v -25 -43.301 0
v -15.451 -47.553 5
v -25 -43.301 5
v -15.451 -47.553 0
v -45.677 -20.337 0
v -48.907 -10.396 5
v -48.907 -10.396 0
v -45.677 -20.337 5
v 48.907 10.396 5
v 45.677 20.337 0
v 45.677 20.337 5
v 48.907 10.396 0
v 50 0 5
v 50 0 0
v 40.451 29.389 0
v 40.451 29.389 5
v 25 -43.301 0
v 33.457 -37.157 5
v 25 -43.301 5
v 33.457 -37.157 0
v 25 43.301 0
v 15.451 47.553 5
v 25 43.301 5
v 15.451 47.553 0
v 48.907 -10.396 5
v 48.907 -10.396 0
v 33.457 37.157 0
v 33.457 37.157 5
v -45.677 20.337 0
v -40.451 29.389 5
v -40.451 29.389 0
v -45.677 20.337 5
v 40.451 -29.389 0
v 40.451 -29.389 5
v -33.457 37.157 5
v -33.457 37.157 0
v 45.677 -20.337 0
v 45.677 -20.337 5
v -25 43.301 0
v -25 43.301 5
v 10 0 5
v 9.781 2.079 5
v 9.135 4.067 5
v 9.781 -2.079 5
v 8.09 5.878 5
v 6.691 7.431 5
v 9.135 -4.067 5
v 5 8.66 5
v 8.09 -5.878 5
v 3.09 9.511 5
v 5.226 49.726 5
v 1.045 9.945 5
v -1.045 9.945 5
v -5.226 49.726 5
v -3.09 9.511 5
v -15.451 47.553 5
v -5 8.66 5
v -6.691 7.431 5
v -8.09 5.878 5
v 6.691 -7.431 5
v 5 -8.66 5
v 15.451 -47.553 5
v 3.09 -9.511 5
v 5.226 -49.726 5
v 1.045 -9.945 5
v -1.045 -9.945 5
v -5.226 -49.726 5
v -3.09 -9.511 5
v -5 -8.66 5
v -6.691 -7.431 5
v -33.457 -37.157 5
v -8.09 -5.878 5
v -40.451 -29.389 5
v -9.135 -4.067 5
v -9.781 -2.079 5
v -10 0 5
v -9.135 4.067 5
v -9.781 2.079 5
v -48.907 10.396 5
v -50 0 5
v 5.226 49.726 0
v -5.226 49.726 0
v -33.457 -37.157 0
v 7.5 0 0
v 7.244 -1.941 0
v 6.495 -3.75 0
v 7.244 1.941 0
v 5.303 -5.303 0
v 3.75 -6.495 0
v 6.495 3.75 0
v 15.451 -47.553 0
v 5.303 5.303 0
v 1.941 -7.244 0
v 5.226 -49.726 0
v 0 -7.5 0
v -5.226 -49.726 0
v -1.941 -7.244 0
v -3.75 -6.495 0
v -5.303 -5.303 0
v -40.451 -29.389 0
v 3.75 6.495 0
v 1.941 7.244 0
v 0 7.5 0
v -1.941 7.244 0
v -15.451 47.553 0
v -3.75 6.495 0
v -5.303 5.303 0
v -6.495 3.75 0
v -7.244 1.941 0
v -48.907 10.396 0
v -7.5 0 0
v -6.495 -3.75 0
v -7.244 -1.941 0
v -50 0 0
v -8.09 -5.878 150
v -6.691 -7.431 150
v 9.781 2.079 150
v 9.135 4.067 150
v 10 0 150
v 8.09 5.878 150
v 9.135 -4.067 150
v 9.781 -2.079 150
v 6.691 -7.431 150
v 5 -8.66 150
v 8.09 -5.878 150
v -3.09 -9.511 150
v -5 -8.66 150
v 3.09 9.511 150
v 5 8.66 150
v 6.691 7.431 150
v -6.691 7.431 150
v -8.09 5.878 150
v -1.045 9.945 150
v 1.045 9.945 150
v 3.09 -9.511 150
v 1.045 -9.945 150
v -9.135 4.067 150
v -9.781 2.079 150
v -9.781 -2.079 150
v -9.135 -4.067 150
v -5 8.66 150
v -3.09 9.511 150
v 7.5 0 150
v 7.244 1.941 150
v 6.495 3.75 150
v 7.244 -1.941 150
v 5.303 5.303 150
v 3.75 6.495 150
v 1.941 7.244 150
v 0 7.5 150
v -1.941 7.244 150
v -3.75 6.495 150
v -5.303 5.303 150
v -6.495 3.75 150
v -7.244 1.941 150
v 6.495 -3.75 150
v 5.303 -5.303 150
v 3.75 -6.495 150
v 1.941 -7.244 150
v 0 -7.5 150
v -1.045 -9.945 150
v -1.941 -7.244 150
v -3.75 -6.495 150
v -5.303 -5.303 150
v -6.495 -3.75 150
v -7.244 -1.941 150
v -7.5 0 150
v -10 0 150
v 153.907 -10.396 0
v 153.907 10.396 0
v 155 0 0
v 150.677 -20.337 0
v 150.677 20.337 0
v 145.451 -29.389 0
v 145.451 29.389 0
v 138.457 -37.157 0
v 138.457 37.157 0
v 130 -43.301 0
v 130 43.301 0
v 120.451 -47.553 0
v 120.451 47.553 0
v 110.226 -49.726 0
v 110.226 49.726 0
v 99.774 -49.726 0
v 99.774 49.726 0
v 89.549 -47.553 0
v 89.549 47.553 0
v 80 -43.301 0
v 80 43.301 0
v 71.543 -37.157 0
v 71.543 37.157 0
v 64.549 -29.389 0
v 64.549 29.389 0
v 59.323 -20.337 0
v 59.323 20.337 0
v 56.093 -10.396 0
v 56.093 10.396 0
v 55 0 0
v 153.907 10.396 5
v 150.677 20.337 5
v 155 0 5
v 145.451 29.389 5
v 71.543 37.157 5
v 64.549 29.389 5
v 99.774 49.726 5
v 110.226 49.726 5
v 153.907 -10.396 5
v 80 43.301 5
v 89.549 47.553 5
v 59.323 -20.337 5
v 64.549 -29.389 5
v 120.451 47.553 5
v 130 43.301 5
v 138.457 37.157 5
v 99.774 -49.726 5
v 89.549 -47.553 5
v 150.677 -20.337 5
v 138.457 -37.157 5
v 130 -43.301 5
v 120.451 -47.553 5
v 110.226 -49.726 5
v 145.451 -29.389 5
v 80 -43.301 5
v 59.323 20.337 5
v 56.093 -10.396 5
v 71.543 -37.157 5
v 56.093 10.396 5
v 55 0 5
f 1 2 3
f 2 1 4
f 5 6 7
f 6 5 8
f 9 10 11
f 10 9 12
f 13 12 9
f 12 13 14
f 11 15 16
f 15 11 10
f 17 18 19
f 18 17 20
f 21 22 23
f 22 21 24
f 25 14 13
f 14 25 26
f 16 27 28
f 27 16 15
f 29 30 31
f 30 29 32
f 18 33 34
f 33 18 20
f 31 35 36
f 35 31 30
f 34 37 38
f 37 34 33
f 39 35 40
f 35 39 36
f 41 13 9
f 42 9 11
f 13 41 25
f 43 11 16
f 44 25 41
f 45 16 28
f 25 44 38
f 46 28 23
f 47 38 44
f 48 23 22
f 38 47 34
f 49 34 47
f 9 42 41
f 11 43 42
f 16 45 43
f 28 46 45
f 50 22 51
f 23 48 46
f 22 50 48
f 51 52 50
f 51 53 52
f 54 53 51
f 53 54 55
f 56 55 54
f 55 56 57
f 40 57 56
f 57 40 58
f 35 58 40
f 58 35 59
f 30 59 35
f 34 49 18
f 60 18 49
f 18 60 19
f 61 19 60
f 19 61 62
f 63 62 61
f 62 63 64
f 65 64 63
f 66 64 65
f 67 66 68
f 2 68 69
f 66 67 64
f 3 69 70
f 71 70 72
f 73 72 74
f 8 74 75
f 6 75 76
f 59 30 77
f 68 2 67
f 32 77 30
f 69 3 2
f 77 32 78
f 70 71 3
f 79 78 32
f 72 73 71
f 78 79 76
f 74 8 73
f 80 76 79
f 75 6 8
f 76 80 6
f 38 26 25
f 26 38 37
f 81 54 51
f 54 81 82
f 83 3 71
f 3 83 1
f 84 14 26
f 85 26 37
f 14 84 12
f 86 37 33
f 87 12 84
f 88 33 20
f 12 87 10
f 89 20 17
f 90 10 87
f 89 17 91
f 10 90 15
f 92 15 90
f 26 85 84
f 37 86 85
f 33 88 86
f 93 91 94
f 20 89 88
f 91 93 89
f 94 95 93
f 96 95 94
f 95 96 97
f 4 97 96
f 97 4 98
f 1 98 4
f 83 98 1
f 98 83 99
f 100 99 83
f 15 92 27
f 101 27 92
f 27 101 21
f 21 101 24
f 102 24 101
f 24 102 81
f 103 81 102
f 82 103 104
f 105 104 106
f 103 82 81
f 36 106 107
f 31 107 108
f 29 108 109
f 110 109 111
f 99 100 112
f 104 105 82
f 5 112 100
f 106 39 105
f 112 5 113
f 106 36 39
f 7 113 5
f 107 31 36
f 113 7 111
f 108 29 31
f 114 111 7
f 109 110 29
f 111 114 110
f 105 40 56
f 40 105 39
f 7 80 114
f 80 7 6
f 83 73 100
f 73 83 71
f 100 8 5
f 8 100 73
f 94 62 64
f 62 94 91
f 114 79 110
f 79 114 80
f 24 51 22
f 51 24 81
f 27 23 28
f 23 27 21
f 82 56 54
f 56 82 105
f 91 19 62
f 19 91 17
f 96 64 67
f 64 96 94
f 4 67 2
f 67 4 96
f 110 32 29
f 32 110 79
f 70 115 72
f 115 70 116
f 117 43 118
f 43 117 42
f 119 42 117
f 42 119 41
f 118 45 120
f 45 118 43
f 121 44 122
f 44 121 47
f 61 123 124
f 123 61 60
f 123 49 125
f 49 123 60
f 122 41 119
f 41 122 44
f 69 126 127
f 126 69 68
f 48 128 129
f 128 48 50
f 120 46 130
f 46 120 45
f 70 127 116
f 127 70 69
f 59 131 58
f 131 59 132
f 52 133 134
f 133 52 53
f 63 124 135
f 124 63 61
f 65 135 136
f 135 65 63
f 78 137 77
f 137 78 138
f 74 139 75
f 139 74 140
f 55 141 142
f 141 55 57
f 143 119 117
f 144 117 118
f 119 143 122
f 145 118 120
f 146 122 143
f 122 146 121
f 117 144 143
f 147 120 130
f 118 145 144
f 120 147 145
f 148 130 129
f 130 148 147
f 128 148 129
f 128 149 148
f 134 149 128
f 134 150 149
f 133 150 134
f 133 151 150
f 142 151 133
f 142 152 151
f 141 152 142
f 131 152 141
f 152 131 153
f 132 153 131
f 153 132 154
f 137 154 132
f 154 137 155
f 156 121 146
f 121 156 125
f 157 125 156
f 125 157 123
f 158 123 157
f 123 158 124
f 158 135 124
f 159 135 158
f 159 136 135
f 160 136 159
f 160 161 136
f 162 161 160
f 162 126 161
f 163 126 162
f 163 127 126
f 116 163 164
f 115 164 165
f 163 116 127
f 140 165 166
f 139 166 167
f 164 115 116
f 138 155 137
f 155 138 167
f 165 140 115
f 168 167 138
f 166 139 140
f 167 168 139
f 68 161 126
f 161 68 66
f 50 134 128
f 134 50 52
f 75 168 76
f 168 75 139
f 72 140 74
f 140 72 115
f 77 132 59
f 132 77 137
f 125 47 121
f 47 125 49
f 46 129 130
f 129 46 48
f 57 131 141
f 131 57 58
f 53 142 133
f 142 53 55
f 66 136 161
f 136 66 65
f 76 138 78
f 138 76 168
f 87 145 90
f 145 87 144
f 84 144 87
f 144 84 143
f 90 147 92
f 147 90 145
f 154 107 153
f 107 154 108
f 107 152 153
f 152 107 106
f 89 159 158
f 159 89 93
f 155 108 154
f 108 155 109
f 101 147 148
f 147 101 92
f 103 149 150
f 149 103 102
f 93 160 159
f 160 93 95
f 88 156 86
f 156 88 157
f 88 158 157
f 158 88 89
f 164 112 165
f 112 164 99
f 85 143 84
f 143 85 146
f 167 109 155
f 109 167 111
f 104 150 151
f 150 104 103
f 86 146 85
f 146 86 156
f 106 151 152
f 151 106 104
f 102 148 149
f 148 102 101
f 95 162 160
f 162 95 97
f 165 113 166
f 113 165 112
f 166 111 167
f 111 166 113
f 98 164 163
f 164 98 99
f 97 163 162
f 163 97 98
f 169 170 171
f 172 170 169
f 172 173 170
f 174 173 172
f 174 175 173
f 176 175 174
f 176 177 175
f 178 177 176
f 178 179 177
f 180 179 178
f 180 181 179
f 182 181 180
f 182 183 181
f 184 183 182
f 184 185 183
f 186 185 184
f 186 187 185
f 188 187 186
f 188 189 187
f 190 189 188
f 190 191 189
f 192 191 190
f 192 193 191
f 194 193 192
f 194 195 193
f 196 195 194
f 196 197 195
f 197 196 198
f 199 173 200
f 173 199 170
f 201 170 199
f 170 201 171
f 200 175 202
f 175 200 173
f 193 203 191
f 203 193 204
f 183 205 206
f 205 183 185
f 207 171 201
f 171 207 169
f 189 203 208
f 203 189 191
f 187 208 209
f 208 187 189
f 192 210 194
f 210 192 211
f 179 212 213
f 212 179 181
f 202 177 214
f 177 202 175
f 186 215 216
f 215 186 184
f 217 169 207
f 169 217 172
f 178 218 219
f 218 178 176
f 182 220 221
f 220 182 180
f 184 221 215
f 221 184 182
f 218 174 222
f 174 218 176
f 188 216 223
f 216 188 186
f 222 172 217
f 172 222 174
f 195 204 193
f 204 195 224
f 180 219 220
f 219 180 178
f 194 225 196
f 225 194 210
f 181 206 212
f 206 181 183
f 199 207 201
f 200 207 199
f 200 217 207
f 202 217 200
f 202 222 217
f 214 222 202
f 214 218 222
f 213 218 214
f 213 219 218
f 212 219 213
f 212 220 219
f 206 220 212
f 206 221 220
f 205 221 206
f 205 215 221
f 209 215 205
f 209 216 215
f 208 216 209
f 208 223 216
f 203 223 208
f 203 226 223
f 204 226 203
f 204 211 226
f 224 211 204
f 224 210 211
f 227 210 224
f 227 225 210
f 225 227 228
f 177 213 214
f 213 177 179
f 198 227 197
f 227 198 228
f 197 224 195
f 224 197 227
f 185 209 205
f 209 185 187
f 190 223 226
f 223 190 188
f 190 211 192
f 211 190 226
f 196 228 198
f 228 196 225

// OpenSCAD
FLANGE_DIAMETER = 100;
FLANGE_HEIGHT = 5;
SPINDLE_DIAMETER = 20;
SPINDLE_HEIGHT = 150;
POST_DIAMETER =15;

difference(){
    union(){
        cylinder(r=FLANGE_DIAMETER/2,h=FLANGE_HEIGHT);
        cylinder(r=SPINDLE_DIAMETER/2, h=SPINDLE_HEIGHT);
    }
    
    cylinder(r=POST_DIAMETER/2,h=SPINDLE_HEIGHT+(FLANGE_HEIGHT*2));
}

// top flange
translate([FLANGE_DIAMETER*1.05,0,0]){
    cylinder(r=FLANGE_DIAMETER/2,h=FLANGE_HEIGHT);
}
